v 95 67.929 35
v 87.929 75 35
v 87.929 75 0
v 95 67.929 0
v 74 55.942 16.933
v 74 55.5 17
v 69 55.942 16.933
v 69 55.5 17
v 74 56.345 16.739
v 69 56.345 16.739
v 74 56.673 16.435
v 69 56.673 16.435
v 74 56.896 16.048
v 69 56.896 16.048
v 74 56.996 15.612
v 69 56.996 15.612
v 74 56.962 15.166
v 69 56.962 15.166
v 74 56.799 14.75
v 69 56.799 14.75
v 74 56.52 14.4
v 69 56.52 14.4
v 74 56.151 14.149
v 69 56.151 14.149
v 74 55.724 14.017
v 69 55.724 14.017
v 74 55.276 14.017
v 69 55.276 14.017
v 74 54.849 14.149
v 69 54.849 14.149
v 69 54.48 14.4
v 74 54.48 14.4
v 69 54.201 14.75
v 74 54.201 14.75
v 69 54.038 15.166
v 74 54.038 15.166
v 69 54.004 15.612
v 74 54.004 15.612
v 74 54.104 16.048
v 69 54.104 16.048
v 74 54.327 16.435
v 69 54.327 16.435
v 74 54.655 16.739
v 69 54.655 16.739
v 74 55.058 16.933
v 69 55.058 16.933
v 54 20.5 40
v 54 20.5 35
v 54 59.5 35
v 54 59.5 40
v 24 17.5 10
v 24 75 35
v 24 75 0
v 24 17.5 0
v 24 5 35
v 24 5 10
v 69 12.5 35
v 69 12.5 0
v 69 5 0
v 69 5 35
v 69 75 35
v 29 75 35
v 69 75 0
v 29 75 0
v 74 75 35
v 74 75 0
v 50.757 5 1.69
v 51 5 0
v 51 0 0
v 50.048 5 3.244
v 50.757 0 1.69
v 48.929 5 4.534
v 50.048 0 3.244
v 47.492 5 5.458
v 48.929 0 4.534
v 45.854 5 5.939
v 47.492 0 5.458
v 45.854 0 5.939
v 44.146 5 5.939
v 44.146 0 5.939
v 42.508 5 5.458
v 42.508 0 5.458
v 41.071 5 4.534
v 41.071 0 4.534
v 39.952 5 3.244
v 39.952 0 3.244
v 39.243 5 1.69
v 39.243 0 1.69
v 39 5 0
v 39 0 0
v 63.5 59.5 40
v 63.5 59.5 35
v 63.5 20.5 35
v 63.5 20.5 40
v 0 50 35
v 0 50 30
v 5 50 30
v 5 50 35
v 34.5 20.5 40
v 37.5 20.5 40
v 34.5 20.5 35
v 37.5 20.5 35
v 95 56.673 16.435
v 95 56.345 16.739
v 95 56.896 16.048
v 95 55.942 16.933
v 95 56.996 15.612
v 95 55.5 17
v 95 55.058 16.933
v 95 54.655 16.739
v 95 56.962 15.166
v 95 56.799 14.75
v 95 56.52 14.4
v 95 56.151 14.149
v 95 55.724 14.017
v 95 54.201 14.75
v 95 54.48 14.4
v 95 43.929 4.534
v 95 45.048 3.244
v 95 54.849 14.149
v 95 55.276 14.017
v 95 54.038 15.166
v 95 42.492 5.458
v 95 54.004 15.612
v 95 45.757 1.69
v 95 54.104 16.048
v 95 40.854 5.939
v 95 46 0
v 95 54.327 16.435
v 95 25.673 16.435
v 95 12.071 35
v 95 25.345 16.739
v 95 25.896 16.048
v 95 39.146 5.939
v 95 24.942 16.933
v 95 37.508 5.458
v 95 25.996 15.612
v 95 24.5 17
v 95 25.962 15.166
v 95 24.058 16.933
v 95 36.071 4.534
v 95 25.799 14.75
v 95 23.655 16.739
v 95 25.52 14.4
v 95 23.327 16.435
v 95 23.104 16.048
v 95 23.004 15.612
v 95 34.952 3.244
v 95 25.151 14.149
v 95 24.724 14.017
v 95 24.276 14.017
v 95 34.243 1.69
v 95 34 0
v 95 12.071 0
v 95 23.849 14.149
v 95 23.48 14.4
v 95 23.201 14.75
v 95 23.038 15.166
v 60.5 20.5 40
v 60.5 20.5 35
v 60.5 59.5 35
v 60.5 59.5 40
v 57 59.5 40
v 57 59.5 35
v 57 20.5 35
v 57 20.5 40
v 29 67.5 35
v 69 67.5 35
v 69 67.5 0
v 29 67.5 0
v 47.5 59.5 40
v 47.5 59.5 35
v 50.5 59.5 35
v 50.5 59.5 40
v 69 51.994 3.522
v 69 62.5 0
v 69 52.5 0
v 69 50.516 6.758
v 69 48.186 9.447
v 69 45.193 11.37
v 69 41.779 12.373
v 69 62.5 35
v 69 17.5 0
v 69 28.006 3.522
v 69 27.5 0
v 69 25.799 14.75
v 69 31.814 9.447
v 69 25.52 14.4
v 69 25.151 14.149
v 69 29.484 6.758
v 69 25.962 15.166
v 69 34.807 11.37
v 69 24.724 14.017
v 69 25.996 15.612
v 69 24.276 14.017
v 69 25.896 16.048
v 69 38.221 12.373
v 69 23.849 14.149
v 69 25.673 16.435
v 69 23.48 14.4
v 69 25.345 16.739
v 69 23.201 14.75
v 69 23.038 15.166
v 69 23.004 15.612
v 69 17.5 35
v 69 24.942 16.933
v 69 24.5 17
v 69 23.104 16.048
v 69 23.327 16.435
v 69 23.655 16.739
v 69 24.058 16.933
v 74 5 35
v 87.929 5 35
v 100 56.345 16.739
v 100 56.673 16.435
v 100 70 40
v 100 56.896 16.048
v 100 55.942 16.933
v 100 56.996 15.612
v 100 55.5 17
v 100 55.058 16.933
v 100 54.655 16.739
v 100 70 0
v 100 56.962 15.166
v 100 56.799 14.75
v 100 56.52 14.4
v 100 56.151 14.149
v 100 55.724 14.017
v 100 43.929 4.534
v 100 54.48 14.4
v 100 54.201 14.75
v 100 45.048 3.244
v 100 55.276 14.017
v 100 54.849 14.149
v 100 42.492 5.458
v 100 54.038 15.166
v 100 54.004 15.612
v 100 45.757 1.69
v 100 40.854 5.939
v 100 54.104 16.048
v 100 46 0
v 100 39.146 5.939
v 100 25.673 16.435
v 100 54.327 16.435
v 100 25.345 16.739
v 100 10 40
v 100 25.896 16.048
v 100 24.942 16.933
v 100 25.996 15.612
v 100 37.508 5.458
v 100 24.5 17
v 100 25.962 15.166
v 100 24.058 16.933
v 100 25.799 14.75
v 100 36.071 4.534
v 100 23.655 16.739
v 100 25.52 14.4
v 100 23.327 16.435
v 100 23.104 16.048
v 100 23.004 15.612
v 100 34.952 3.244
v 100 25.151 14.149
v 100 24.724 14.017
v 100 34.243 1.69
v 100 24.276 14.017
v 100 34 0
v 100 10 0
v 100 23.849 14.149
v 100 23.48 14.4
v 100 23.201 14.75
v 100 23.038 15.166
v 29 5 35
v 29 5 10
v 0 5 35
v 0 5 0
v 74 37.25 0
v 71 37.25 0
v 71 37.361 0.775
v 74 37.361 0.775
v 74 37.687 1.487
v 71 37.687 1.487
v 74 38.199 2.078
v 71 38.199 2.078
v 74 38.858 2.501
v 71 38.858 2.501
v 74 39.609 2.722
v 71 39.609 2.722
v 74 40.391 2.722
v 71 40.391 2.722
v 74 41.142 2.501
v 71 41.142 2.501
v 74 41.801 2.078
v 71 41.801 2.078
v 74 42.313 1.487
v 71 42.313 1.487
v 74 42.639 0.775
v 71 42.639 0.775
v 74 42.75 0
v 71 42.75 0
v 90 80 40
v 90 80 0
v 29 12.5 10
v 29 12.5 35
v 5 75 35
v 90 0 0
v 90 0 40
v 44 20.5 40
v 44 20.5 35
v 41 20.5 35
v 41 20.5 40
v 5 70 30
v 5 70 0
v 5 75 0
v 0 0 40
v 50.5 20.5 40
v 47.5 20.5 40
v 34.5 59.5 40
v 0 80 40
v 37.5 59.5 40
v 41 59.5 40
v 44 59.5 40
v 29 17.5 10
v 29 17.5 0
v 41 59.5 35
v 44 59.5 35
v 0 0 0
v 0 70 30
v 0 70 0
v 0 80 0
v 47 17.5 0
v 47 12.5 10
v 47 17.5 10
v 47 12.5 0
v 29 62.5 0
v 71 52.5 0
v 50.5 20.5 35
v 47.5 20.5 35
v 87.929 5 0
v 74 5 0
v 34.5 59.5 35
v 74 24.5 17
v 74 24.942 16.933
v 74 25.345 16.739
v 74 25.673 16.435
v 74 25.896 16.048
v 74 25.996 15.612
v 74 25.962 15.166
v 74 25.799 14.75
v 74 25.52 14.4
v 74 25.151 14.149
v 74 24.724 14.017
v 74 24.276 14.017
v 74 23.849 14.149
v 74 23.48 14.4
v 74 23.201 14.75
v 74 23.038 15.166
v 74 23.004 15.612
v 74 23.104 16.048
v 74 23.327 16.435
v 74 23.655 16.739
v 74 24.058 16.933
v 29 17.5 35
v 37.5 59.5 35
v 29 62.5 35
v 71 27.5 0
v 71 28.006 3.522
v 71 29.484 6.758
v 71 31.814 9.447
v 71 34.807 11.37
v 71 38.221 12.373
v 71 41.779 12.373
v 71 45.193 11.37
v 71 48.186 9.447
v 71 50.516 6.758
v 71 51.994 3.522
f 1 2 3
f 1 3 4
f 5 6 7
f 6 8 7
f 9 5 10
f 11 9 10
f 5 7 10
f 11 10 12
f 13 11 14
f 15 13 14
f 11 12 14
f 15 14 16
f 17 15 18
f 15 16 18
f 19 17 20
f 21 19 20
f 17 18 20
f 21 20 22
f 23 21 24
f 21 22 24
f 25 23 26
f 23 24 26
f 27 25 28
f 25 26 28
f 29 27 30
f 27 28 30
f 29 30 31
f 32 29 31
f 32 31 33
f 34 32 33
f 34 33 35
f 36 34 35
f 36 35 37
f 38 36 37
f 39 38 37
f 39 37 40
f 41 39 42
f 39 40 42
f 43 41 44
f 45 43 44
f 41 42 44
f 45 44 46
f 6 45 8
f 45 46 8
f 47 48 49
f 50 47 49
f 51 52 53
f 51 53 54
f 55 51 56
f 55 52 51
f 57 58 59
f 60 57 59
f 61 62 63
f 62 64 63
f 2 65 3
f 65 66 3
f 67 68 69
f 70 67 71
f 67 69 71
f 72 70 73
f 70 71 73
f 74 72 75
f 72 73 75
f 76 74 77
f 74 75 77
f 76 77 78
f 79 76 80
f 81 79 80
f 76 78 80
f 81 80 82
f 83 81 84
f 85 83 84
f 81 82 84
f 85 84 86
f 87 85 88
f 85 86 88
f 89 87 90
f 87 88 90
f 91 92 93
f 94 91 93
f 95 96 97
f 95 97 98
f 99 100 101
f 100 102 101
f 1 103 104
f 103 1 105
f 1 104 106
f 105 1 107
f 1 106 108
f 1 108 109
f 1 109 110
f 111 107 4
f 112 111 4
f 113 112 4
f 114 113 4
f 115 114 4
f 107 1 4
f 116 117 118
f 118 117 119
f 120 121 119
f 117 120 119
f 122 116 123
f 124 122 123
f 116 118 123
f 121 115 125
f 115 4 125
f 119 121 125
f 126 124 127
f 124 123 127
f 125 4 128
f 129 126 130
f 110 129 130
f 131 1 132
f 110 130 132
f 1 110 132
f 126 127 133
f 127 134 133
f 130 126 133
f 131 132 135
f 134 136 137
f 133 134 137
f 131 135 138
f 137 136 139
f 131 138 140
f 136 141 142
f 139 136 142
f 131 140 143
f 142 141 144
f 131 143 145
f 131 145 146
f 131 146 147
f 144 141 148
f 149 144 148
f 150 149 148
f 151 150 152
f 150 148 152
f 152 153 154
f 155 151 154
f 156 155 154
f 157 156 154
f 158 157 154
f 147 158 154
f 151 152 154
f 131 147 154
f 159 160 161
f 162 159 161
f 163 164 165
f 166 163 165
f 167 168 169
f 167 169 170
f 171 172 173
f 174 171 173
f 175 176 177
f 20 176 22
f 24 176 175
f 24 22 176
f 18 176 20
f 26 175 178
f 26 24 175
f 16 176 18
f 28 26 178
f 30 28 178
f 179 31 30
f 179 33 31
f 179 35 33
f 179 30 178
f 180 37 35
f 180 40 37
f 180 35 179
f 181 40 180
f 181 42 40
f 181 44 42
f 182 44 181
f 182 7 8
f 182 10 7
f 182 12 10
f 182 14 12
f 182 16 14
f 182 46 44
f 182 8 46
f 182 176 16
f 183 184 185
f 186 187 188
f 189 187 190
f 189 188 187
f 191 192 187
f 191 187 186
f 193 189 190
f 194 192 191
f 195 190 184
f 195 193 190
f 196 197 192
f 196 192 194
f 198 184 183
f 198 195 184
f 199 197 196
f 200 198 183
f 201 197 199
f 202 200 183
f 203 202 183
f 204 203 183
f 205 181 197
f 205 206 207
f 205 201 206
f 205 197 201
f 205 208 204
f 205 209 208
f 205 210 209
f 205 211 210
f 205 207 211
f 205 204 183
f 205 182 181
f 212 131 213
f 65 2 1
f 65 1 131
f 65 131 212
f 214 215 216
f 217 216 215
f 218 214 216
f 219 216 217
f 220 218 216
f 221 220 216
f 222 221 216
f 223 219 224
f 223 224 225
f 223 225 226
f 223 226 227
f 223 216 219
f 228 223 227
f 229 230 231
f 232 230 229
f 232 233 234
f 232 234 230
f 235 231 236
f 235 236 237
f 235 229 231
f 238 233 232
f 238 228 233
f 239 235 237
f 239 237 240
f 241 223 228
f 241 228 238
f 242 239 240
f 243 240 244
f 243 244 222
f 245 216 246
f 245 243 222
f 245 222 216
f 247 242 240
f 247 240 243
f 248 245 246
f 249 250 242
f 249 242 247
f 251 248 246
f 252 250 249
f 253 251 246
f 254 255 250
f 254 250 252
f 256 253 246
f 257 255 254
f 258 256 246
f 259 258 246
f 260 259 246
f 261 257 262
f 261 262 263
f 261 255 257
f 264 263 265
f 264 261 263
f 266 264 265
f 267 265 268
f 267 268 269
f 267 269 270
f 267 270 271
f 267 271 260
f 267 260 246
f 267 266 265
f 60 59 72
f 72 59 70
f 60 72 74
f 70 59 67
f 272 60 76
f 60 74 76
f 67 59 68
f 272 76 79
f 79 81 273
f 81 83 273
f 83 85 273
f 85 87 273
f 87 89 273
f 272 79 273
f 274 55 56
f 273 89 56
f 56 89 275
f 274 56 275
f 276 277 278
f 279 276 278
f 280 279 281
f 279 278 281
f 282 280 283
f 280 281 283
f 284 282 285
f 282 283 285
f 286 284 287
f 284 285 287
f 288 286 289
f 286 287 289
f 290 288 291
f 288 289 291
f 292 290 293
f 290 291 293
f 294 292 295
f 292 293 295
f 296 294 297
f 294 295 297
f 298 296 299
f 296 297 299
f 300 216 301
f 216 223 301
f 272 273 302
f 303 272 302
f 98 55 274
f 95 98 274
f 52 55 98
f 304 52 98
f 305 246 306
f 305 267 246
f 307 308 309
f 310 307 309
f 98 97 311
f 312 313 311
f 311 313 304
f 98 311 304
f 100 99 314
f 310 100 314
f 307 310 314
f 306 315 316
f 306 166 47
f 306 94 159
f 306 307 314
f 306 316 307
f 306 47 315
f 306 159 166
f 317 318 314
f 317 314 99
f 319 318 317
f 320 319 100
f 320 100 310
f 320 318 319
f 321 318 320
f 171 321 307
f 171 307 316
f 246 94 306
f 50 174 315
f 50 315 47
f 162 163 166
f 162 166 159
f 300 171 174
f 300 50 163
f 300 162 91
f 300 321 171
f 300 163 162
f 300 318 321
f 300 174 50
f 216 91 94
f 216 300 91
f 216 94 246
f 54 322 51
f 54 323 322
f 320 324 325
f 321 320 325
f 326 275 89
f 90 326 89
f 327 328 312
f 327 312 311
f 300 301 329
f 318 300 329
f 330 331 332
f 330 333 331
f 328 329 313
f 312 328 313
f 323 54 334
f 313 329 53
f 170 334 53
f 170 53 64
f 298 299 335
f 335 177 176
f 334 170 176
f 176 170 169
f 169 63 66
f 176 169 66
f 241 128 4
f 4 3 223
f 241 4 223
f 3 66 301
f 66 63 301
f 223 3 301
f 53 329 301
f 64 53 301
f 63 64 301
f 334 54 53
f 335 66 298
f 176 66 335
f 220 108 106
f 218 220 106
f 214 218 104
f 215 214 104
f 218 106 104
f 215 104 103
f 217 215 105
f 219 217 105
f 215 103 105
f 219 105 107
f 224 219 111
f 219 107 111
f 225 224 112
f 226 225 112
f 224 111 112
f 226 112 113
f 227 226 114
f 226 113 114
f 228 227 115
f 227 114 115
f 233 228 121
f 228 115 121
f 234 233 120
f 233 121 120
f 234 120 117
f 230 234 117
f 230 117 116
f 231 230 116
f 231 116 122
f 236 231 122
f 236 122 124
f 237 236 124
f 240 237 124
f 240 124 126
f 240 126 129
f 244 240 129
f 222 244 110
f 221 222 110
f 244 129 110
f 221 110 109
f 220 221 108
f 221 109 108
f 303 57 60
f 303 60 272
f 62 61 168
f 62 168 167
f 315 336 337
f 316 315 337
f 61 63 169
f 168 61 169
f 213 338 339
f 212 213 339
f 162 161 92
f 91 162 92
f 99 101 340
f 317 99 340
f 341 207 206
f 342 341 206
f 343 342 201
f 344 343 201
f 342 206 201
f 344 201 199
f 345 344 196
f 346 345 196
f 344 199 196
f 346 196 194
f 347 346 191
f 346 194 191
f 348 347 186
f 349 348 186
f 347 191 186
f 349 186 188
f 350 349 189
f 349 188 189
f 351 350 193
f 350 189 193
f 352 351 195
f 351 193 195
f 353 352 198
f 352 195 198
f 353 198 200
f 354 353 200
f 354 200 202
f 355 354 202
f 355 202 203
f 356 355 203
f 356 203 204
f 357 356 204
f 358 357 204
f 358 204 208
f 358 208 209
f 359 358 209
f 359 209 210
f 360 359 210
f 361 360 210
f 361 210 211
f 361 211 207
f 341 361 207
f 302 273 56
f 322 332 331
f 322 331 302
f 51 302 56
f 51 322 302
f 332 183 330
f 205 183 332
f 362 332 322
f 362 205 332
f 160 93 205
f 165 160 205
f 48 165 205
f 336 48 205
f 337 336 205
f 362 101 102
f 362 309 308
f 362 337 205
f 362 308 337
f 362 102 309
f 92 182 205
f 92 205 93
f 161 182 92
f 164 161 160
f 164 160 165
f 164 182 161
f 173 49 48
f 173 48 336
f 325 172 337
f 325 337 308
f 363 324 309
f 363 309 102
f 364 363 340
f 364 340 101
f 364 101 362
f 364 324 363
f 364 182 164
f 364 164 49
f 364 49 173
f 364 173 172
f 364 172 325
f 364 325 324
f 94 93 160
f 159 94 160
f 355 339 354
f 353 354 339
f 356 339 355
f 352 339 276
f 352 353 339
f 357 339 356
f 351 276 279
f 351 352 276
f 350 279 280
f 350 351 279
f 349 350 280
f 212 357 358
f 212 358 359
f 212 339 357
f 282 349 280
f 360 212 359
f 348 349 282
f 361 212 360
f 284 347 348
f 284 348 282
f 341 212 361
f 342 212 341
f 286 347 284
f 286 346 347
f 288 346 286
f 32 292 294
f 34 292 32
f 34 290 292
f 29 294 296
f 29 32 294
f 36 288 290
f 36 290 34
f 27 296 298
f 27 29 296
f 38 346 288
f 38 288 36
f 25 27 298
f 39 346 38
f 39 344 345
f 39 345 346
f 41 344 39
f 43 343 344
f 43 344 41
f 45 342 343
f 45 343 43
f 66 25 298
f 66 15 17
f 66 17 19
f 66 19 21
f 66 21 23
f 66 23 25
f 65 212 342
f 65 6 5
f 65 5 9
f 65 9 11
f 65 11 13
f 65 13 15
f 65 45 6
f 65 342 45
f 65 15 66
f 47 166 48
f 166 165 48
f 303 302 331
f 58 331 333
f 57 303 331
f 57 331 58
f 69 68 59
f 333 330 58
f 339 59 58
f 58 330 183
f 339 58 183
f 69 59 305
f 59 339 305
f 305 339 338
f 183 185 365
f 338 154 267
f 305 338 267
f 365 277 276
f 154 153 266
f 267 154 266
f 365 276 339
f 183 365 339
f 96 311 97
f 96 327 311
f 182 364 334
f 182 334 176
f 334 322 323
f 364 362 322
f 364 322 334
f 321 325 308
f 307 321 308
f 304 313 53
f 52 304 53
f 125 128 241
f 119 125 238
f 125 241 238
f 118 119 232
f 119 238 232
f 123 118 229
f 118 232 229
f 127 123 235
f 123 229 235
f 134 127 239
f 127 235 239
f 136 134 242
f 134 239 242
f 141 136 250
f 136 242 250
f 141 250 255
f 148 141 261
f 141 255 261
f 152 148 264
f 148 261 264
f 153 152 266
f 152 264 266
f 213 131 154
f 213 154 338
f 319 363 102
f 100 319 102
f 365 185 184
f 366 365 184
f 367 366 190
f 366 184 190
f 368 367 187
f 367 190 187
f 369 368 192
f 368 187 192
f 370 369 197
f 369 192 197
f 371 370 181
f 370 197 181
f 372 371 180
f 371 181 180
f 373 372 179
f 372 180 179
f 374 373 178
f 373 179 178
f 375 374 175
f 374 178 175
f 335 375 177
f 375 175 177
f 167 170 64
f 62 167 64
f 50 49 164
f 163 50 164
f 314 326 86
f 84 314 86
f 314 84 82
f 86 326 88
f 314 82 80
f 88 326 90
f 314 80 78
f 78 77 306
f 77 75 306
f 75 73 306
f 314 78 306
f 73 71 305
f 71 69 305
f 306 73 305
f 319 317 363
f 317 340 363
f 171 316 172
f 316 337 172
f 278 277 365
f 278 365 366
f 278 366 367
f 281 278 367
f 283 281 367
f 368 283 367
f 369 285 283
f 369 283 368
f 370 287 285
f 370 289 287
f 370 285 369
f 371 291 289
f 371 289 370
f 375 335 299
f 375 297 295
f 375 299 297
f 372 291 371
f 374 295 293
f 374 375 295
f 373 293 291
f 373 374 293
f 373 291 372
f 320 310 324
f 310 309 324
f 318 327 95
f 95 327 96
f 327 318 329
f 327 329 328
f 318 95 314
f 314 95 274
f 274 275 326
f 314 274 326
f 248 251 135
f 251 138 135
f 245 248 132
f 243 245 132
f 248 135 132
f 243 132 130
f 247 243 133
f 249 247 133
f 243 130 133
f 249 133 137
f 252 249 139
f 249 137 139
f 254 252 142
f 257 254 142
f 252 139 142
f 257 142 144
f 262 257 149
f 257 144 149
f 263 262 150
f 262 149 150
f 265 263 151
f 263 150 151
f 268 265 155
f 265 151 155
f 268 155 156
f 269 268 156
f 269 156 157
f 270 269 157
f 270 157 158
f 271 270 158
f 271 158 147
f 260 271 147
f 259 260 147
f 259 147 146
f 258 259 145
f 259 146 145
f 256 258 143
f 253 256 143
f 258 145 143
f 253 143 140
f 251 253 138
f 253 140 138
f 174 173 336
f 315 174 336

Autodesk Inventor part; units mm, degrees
ref_plane "YZ Plane" through (0, 0, 0) normal (1, 0, 0) x (0, 1, 0)
ref_plane "XZ Plane" through (0, 0, 0) normal (0, 1, 0) x (-1, 0, 0)
ref_plane "XY Plane" through (0, 0, 0) normal (0, 0, 1) x (1, 0, 0)
sketch "Sketch1" plane through (0, 0, 0) normal (0, 0, 1) x (1, 0, 0)
  line L0 (0, 0) -> (100, 0)
  line L1 (100, 0) -> (100, 80) construction
  line L2 (100, 80) -> (0, 80)
  line L3 (0, 80) -> (0, 0)
  line L4 (100, 70) -> (90, 80)
  line L5 (100, 10) -> (90, 0)
  line L6 (100, 70) -> (100, 10)
  dimension "d0" = 100
  dimension "d1" = 80
  dimension "d23" = 10
  dimension "d24" = 10
  dimension "d25" = 10
  dimension "d26" = 10
extrude "Extrusion1" add sketch "Sketch1" along normal blind 40
sketch "Sketch4" plane through (0, 0, 0) normal (0, 0, -1) x (-1, 0, 0)
  line L0 (-90, 80) -> (0, 80) projected
  line L1 (0, 0) -> (-90, 0) projected
  line L2 (-100, 70) -> (-90, 80) projected
  line L3 (-100, 10) -> (-100, 70) projected
  line L4 (-90, 0) -> (-100, 10) projected
  line L5 (0, 75) -> (-87.9289, 75)
  line L6 (-87.9289, 75) -> (-95, 67.9289)
  line L7 (-95, 67.9289) -> (-95, 12.0711)
  line L8 (-95, 12.0711) -> (-87.9289, 5)
  line L9 (-87.9289, 5) -> (0, 5)
  line L10 (0, 75) -> (0, 5)
  line L11 (0, 80) -> (0, 0) projected
  dimension "d27" = 5
extrude "Extrusion4" cut sketch "Sketch4" against normal blind 35 contours L10 L9 L8 L7 L6 L5
sketch "Sketch5" plane through (0, 0, 40) normal (-1, 0, 0) x (0, 0, 1)
  line L0 (0, 0) -> (0, 80)
  line L1 (-40, 5) -> (-40, 75)
  line L2 (0, 80) -> (-40, 80)
  line L3 (-40, 80) -> (-40, 70)
  line L4 (-40, 70) -> (0, 70)
  line L5 (0, 70) -> (0, 80)
  line L6 (0, 80) -> (-10, 80)
  line L7 (-10, 80) -> (-10, 50)
  line L8 (-10, 50) -> (0, 50)
  line L9 (0, 50) -> (0, 80)
  line L10 (-40, 0) -> (0, 0)
  dimension "d15" = 10
  dimension "d16" = 10
  dimension "d17" = 50
extrude "Extrusion5" add sketch "Sketch5" against normal blind 5
sketch "Sketch6" plane through (100, 10, 0) normal (1, 0, 0) x (0, 0, -1)
  circle A0 centre (0, 30) radius 6
  line L0 (0, 0) -> (0, 60) projected
  dimension "d20" = 12
extrude "Extrusion6" cut sketch "Sketch6" against normal through all
sketch "Sketch7" plane through (0, 0, 35) normal (0, 0, -1) x (-1, 0, 0)
  line L0 (-87.9289, 75) -> (-5, 75) projected
  line L1 (0, 5) -> (-87.9289, 5) projected
  line L2 (-74, 75) -> (-69, 75)
  line L3 (-69, 75) -> (-69, 5)
  line L4 (-69, 5) -> (-74, 5)
  line L5 (-74, 5) -> (-74, 75)
  line L6 (-95, 46) -> (-95, 67.9289) projected
  line L7 (-29, 75) -> (-24, 75)
  line L8 (-24, 75) -> (-24, 5)
  line L9 (-24, 5) -> (-29, 5)
  line L10 (-29, 5) -> (-29, 75)
  line L11 (-69, 67.5) -> (-29, 67.5)
  line L12 (-29, 67.5) -> (-29, 62.5)
  line L13 (-29, 62.5) -> (-69, 62.5)
  line L14 (-69, 62.5) -> (-69, 67.5)
  line L15 (-69, 17.5) -> (-29, 17.5)
  line L16 (-29, 17.5) -> (-29, 12.5)
  line L17 (-29, 12.5) -> (-69, 12.5)
  line L18 (-69, 12.5) -> (-69, 17.5)
  line L19 (-49, 67.5) -> (-49, 12.5) construction
  point P0 (0, 0)
  point P1 (-49, 40)
  point P2 (-69, 40)
  dimension "d28" = 5
  dimension "d29" = 21
  dimension "d30" = 5
  dimension "d31" = 40
  dimension "d32" = 5
  dimension "d33" = 5
  dimension "d34" = 45
extrude "Extrusion7" add sketch "Sketch7" along normal blind 35 contours L0 L3 L1 L5 | L0 L8 L1 L10 | L11 L10 L13 L3 | L3 L15 L10 L17
sketch "Sketch8" plane through (0, 0, 0) normal (0, 0, -1) x (-1, 0, 0)
  line L0 (-24, 5) -> (-24, 75) projected
  line L1 (-69, 17.5) -> (-29, 17.5) projected
  line L2 (-24, 5) -> (-47, 5)
  line L3 (-47, 5) -> (-47, 17.5)
  line L4 (-47, 17.5) -> (-24, 17.5)
  line L5 (-24, 17.5) -> (-24, 5)
  point P0 (0, 0)
  dimension "d37" = 23
extrude "Extrusion8" cut sketch "Sketch8" against normal blind 10
sketch "Sketch9" plane through (69, 17.5, 35) normal (-1, 0, 0) x (0, 0, 1)
  line L0 (-35, 0) -> (-35, 45) projected
  circle A0 centre (-35, 22.5) radius 2.75
  line L1 (-50.5, 7) -> (-19.5, 7) construction
  line L2 (-19.5, 7) -> (-19.5, 38) construction
  line L3 (-19.5, 38) -> (-50.5, 38) construction
  line L4 (-50.5, 38) -> (-50.5, 7) construction
  line L5 (-50.5, 7) -> (-19.5, 38) construction
  line L6 (-19.5, 7) -> (-50.5, 38) construction
  circle A1 centre (-19.5, 38) radius 1.5
  circle A2 centre (-19.5, 7) radius 1.5
  point P0 (-35, -17.5)
  dimension "d40" = 5.5
  dimension "d41" = 31
  dimension "d42" = 31
  dimension "d43" = 3
  dimension "d44" = 3
extrude "Extrusion9" cut sketch "Sketch9" against normal through all
sketch "Sketch10" plane through (0, 0, 35) normal (0, 0, -1) x (-1, 0, 0)
  line L0 (-34.5, 59.5) -> (-37.5, 59.5)
  line L1 (-37.5, 59.5) -> (-37.5, 20.5)
  line L2 (-37.5, 20.5) -> (-34.5, 20.5)
  line L3 (-34.5, 20.5) -> (-34.5, 59.5)
  line L4 (-29, 62.5) -> (-29, 17.5) projected
  line L5 (-69, 62.5) -> (-29, 62.5) projected
  line L6 (-29, 17.5) -> (-24, 17.5) projected
  line L7 (-41, 59.5) -> (-44, 59.5)
  line L8 (-44, 59.5) -> (-44, 20.5)
  line L9 (-44, 20.5) -> (-41, 20.5)
  line L10 (-41, 20.5) -> (-41, 59.5)
  line L11 (-47.5, 59.5) -> (-50.5, 59.5)
  line L12 (-50.5, 59.5) -> (-50.5, 20.5)
  line L13 (-50.5, 20.5) -> (-47.5, 20.5)
  line L14 (-47.5, 20.5) -> (-47.5, 59.5)
  line L15 (-54, 59.5) -> (-57, 59.5)
  line L16 (-57, 59.5) -> (-57, 20.5)
  line L17 (-57, 20.5) -> (-54, 20.5)
  line L18 (-54, 20.5) -> (-54, 59.5)
  line L19 (-60.5, 59.5) -> (-63.5, 59.5)
  line L20 (-63.5, 59.5) -> (-63.5, 20.5)
  line L21 (-63.5, 20.5) -> (-60.5, 20.5)
  line L22 (-60.5, 20.5) -> (-60.5, 59.5)
  point P0 (0, 0)
  dimension "d47" = 3
  dimension "d49" = 5.5
  dimension "d50" = 3
  dimension "d51" = 3
  dimension "d54" = 6.5
extrude "Extrusion10" cut sketch "Sketch10" against normal through all
sketch "Sketch11" plane through (0, 0, 0) normal (0, -1, 0) x (1, 0, 0)
  circle A0 centre (45, 0) radius 6
  line L0 (0, 0) -> (90, 0) projected
  dimension "d61" = 12
extrude "Extrusion11" cut sketch "Sketch11" against normal blind 5
sketch "Sketch12" plane through (69, 17.5, 35) normal (-1, 0, 0) x (0, 0, 1)
  arc A0 (-35, 19.75) -> (-35, 25.25) centre (-35, 22.5) ccw projected
  circle A1 centre (-35, 22.5) radius 12.5
  point P0 (-35, -17.5)
  dimension "d64" = 25
extrude "Extrusion12" cut sketch "Sketch12" against normal blind 2
properties part number "FA002" material "ABS Plastic"
